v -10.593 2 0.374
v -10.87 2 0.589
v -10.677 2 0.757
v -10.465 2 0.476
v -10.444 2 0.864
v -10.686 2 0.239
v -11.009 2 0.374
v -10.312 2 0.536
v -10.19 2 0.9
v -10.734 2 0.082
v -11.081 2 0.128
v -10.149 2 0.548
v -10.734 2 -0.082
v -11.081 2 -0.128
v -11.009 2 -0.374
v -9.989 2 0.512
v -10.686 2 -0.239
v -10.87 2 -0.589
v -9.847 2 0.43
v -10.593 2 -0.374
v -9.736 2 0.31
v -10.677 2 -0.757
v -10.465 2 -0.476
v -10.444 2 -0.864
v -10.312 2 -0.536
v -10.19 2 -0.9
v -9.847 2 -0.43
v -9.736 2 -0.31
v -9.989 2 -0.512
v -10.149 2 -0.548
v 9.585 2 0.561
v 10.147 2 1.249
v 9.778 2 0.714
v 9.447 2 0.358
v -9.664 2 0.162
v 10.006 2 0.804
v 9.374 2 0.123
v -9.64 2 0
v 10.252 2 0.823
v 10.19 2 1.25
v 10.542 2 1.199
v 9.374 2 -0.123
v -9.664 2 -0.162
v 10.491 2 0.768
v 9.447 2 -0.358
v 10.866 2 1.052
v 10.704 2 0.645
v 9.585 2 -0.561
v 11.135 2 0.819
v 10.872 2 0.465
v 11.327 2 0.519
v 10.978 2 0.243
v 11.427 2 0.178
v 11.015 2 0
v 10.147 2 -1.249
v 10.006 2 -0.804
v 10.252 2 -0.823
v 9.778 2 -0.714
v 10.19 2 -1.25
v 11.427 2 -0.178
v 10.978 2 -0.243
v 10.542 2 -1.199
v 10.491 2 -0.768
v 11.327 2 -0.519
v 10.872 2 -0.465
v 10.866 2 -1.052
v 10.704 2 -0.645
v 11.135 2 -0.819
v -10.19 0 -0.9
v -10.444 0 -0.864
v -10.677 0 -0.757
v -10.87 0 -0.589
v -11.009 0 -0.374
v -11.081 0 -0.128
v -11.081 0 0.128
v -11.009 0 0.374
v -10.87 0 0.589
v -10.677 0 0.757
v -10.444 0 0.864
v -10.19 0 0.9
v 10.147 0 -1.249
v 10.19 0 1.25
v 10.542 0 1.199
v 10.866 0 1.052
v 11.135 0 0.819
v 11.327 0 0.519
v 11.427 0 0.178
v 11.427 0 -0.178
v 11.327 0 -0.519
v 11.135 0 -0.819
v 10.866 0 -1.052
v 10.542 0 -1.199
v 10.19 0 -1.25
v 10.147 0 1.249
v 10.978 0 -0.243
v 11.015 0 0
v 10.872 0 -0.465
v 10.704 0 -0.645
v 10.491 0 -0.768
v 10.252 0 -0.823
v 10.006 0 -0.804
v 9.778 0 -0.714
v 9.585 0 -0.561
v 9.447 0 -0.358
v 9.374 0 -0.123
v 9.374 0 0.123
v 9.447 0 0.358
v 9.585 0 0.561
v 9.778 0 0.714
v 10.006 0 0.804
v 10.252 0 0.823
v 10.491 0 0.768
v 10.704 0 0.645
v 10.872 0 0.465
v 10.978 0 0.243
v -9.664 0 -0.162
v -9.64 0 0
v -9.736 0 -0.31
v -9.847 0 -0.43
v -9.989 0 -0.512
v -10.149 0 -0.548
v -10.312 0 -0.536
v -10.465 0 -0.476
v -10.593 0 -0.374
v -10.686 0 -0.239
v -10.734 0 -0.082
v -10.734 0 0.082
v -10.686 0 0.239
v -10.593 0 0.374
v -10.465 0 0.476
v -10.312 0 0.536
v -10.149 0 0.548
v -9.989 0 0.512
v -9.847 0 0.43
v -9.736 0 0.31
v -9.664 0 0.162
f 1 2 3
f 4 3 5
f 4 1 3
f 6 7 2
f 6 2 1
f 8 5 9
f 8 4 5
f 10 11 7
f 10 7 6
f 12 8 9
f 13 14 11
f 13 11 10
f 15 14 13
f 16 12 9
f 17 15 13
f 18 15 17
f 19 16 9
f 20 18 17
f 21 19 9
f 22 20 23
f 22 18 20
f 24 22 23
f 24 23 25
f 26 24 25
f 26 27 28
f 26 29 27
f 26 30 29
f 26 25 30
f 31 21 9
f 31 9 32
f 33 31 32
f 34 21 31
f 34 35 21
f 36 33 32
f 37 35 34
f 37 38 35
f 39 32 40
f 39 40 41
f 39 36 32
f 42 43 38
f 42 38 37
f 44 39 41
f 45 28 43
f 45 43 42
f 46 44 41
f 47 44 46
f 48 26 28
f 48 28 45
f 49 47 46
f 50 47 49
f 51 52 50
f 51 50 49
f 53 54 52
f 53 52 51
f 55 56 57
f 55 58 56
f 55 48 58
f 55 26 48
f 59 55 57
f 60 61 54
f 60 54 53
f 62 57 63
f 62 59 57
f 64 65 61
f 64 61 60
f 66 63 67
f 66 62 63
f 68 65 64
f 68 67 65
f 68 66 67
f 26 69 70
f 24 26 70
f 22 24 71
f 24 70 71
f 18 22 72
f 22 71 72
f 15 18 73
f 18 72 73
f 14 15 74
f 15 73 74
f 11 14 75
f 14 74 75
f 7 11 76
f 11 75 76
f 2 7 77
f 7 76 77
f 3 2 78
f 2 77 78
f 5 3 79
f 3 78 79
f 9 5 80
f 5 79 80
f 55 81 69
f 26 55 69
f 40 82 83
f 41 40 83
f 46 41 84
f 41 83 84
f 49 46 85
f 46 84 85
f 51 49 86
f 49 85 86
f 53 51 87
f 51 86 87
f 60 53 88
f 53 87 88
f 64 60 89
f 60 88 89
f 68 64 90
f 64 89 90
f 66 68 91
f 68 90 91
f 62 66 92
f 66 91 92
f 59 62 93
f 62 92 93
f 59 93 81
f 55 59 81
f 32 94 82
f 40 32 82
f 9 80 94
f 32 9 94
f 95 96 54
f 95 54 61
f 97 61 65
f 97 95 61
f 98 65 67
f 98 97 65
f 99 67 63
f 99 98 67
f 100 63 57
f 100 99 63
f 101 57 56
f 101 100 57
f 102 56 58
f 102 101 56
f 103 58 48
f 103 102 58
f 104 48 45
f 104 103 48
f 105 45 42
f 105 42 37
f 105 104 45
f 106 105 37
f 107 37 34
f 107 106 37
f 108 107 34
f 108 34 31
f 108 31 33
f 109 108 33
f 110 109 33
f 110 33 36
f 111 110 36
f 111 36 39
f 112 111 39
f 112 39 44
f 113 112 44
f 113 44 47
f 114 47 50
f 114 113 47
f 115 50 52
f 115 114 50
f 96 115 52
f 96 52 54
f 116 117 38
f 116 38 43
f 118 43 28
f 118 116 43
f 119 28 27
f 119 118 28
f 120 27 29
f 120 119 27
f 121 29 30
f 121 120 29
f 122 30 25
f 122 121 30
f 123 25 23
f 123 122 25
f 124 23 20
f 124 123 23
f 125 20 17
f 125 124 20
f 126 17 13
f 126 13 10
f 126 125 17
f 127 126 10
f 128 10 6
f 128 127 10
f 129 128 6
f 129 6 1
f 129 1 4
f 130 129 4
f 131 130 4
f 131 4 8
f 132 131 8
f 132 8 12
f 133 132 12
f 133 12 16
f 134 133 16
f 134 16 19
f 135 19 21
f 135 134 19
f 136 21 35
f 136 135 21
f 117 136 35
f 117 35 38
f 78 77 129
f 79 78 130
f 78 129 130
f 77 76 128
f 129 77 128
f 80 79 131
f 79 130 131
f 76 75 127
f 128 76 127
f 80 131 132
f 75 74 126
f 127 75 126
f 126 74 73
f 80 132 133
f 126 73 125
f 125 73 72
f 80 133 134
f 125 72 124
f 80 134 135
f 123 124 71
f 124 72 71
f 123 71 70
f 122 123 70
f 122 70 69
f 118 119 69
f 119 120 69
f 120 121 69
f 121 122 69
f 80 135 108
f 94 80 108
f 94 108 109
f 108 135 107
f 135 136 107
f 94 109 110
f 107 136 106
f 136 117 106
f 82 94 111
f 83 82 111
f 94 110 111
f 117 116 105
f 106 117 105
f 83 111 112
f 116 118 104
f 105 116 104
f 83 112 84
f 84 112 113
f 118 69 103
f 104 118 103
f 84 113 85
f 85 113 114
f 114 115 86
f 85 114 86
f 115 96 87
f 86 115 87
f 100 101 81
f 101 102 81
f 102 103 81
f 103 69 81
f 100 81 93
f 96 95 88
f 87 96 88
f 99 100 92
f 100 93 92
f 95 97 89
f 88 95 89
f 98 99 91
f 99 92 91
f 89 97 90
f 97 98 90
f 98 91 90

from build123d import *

# Parameters (mm, degrees)
SKETCH1_R           = 0.55
SKETCH1_R_2         = 0.825
BOSS_EXTRUDE1_DEPTH = 2


with BuildPart() as part:
    # Sketch1 → Boss-Extrude1 (new body)
    with BuildSketch(Plane(origin=(0, 0, 0), x_dir=(1, 0, 0), z_dir=(0, 1, 0))):
        with BuildLine():
            Line((10.14707841, 1.249262877), (-10.19, 0.9))
            ThreePointArc((-10.19, 0.9), (-11.09, 0), (-10.19, -0.9))
            Line((-10.19, -0.9), (10.14707841, -1.249262877))
            Line((10.14707841, -1.249262877), (10.19, -1.25))
            ThreePointArc((10.19, -1.25), (11.44, 0), (10.19, 1.25))
            Line((10.19, 1.25), (10.14707841, 1.249262877))
        make_face()
        with Locations((-10.19, 0)):
            Circle(SKETCH1_R, mode=Mode.SUBTRACT)
        with Locations((10.19, 0)):
            Circle(SKETCH1_R_2, mode=Mode.SUBTRACT)
    extrude(amount=BOSS_EXTRUDE1_DEPTH)


solid = part.part
